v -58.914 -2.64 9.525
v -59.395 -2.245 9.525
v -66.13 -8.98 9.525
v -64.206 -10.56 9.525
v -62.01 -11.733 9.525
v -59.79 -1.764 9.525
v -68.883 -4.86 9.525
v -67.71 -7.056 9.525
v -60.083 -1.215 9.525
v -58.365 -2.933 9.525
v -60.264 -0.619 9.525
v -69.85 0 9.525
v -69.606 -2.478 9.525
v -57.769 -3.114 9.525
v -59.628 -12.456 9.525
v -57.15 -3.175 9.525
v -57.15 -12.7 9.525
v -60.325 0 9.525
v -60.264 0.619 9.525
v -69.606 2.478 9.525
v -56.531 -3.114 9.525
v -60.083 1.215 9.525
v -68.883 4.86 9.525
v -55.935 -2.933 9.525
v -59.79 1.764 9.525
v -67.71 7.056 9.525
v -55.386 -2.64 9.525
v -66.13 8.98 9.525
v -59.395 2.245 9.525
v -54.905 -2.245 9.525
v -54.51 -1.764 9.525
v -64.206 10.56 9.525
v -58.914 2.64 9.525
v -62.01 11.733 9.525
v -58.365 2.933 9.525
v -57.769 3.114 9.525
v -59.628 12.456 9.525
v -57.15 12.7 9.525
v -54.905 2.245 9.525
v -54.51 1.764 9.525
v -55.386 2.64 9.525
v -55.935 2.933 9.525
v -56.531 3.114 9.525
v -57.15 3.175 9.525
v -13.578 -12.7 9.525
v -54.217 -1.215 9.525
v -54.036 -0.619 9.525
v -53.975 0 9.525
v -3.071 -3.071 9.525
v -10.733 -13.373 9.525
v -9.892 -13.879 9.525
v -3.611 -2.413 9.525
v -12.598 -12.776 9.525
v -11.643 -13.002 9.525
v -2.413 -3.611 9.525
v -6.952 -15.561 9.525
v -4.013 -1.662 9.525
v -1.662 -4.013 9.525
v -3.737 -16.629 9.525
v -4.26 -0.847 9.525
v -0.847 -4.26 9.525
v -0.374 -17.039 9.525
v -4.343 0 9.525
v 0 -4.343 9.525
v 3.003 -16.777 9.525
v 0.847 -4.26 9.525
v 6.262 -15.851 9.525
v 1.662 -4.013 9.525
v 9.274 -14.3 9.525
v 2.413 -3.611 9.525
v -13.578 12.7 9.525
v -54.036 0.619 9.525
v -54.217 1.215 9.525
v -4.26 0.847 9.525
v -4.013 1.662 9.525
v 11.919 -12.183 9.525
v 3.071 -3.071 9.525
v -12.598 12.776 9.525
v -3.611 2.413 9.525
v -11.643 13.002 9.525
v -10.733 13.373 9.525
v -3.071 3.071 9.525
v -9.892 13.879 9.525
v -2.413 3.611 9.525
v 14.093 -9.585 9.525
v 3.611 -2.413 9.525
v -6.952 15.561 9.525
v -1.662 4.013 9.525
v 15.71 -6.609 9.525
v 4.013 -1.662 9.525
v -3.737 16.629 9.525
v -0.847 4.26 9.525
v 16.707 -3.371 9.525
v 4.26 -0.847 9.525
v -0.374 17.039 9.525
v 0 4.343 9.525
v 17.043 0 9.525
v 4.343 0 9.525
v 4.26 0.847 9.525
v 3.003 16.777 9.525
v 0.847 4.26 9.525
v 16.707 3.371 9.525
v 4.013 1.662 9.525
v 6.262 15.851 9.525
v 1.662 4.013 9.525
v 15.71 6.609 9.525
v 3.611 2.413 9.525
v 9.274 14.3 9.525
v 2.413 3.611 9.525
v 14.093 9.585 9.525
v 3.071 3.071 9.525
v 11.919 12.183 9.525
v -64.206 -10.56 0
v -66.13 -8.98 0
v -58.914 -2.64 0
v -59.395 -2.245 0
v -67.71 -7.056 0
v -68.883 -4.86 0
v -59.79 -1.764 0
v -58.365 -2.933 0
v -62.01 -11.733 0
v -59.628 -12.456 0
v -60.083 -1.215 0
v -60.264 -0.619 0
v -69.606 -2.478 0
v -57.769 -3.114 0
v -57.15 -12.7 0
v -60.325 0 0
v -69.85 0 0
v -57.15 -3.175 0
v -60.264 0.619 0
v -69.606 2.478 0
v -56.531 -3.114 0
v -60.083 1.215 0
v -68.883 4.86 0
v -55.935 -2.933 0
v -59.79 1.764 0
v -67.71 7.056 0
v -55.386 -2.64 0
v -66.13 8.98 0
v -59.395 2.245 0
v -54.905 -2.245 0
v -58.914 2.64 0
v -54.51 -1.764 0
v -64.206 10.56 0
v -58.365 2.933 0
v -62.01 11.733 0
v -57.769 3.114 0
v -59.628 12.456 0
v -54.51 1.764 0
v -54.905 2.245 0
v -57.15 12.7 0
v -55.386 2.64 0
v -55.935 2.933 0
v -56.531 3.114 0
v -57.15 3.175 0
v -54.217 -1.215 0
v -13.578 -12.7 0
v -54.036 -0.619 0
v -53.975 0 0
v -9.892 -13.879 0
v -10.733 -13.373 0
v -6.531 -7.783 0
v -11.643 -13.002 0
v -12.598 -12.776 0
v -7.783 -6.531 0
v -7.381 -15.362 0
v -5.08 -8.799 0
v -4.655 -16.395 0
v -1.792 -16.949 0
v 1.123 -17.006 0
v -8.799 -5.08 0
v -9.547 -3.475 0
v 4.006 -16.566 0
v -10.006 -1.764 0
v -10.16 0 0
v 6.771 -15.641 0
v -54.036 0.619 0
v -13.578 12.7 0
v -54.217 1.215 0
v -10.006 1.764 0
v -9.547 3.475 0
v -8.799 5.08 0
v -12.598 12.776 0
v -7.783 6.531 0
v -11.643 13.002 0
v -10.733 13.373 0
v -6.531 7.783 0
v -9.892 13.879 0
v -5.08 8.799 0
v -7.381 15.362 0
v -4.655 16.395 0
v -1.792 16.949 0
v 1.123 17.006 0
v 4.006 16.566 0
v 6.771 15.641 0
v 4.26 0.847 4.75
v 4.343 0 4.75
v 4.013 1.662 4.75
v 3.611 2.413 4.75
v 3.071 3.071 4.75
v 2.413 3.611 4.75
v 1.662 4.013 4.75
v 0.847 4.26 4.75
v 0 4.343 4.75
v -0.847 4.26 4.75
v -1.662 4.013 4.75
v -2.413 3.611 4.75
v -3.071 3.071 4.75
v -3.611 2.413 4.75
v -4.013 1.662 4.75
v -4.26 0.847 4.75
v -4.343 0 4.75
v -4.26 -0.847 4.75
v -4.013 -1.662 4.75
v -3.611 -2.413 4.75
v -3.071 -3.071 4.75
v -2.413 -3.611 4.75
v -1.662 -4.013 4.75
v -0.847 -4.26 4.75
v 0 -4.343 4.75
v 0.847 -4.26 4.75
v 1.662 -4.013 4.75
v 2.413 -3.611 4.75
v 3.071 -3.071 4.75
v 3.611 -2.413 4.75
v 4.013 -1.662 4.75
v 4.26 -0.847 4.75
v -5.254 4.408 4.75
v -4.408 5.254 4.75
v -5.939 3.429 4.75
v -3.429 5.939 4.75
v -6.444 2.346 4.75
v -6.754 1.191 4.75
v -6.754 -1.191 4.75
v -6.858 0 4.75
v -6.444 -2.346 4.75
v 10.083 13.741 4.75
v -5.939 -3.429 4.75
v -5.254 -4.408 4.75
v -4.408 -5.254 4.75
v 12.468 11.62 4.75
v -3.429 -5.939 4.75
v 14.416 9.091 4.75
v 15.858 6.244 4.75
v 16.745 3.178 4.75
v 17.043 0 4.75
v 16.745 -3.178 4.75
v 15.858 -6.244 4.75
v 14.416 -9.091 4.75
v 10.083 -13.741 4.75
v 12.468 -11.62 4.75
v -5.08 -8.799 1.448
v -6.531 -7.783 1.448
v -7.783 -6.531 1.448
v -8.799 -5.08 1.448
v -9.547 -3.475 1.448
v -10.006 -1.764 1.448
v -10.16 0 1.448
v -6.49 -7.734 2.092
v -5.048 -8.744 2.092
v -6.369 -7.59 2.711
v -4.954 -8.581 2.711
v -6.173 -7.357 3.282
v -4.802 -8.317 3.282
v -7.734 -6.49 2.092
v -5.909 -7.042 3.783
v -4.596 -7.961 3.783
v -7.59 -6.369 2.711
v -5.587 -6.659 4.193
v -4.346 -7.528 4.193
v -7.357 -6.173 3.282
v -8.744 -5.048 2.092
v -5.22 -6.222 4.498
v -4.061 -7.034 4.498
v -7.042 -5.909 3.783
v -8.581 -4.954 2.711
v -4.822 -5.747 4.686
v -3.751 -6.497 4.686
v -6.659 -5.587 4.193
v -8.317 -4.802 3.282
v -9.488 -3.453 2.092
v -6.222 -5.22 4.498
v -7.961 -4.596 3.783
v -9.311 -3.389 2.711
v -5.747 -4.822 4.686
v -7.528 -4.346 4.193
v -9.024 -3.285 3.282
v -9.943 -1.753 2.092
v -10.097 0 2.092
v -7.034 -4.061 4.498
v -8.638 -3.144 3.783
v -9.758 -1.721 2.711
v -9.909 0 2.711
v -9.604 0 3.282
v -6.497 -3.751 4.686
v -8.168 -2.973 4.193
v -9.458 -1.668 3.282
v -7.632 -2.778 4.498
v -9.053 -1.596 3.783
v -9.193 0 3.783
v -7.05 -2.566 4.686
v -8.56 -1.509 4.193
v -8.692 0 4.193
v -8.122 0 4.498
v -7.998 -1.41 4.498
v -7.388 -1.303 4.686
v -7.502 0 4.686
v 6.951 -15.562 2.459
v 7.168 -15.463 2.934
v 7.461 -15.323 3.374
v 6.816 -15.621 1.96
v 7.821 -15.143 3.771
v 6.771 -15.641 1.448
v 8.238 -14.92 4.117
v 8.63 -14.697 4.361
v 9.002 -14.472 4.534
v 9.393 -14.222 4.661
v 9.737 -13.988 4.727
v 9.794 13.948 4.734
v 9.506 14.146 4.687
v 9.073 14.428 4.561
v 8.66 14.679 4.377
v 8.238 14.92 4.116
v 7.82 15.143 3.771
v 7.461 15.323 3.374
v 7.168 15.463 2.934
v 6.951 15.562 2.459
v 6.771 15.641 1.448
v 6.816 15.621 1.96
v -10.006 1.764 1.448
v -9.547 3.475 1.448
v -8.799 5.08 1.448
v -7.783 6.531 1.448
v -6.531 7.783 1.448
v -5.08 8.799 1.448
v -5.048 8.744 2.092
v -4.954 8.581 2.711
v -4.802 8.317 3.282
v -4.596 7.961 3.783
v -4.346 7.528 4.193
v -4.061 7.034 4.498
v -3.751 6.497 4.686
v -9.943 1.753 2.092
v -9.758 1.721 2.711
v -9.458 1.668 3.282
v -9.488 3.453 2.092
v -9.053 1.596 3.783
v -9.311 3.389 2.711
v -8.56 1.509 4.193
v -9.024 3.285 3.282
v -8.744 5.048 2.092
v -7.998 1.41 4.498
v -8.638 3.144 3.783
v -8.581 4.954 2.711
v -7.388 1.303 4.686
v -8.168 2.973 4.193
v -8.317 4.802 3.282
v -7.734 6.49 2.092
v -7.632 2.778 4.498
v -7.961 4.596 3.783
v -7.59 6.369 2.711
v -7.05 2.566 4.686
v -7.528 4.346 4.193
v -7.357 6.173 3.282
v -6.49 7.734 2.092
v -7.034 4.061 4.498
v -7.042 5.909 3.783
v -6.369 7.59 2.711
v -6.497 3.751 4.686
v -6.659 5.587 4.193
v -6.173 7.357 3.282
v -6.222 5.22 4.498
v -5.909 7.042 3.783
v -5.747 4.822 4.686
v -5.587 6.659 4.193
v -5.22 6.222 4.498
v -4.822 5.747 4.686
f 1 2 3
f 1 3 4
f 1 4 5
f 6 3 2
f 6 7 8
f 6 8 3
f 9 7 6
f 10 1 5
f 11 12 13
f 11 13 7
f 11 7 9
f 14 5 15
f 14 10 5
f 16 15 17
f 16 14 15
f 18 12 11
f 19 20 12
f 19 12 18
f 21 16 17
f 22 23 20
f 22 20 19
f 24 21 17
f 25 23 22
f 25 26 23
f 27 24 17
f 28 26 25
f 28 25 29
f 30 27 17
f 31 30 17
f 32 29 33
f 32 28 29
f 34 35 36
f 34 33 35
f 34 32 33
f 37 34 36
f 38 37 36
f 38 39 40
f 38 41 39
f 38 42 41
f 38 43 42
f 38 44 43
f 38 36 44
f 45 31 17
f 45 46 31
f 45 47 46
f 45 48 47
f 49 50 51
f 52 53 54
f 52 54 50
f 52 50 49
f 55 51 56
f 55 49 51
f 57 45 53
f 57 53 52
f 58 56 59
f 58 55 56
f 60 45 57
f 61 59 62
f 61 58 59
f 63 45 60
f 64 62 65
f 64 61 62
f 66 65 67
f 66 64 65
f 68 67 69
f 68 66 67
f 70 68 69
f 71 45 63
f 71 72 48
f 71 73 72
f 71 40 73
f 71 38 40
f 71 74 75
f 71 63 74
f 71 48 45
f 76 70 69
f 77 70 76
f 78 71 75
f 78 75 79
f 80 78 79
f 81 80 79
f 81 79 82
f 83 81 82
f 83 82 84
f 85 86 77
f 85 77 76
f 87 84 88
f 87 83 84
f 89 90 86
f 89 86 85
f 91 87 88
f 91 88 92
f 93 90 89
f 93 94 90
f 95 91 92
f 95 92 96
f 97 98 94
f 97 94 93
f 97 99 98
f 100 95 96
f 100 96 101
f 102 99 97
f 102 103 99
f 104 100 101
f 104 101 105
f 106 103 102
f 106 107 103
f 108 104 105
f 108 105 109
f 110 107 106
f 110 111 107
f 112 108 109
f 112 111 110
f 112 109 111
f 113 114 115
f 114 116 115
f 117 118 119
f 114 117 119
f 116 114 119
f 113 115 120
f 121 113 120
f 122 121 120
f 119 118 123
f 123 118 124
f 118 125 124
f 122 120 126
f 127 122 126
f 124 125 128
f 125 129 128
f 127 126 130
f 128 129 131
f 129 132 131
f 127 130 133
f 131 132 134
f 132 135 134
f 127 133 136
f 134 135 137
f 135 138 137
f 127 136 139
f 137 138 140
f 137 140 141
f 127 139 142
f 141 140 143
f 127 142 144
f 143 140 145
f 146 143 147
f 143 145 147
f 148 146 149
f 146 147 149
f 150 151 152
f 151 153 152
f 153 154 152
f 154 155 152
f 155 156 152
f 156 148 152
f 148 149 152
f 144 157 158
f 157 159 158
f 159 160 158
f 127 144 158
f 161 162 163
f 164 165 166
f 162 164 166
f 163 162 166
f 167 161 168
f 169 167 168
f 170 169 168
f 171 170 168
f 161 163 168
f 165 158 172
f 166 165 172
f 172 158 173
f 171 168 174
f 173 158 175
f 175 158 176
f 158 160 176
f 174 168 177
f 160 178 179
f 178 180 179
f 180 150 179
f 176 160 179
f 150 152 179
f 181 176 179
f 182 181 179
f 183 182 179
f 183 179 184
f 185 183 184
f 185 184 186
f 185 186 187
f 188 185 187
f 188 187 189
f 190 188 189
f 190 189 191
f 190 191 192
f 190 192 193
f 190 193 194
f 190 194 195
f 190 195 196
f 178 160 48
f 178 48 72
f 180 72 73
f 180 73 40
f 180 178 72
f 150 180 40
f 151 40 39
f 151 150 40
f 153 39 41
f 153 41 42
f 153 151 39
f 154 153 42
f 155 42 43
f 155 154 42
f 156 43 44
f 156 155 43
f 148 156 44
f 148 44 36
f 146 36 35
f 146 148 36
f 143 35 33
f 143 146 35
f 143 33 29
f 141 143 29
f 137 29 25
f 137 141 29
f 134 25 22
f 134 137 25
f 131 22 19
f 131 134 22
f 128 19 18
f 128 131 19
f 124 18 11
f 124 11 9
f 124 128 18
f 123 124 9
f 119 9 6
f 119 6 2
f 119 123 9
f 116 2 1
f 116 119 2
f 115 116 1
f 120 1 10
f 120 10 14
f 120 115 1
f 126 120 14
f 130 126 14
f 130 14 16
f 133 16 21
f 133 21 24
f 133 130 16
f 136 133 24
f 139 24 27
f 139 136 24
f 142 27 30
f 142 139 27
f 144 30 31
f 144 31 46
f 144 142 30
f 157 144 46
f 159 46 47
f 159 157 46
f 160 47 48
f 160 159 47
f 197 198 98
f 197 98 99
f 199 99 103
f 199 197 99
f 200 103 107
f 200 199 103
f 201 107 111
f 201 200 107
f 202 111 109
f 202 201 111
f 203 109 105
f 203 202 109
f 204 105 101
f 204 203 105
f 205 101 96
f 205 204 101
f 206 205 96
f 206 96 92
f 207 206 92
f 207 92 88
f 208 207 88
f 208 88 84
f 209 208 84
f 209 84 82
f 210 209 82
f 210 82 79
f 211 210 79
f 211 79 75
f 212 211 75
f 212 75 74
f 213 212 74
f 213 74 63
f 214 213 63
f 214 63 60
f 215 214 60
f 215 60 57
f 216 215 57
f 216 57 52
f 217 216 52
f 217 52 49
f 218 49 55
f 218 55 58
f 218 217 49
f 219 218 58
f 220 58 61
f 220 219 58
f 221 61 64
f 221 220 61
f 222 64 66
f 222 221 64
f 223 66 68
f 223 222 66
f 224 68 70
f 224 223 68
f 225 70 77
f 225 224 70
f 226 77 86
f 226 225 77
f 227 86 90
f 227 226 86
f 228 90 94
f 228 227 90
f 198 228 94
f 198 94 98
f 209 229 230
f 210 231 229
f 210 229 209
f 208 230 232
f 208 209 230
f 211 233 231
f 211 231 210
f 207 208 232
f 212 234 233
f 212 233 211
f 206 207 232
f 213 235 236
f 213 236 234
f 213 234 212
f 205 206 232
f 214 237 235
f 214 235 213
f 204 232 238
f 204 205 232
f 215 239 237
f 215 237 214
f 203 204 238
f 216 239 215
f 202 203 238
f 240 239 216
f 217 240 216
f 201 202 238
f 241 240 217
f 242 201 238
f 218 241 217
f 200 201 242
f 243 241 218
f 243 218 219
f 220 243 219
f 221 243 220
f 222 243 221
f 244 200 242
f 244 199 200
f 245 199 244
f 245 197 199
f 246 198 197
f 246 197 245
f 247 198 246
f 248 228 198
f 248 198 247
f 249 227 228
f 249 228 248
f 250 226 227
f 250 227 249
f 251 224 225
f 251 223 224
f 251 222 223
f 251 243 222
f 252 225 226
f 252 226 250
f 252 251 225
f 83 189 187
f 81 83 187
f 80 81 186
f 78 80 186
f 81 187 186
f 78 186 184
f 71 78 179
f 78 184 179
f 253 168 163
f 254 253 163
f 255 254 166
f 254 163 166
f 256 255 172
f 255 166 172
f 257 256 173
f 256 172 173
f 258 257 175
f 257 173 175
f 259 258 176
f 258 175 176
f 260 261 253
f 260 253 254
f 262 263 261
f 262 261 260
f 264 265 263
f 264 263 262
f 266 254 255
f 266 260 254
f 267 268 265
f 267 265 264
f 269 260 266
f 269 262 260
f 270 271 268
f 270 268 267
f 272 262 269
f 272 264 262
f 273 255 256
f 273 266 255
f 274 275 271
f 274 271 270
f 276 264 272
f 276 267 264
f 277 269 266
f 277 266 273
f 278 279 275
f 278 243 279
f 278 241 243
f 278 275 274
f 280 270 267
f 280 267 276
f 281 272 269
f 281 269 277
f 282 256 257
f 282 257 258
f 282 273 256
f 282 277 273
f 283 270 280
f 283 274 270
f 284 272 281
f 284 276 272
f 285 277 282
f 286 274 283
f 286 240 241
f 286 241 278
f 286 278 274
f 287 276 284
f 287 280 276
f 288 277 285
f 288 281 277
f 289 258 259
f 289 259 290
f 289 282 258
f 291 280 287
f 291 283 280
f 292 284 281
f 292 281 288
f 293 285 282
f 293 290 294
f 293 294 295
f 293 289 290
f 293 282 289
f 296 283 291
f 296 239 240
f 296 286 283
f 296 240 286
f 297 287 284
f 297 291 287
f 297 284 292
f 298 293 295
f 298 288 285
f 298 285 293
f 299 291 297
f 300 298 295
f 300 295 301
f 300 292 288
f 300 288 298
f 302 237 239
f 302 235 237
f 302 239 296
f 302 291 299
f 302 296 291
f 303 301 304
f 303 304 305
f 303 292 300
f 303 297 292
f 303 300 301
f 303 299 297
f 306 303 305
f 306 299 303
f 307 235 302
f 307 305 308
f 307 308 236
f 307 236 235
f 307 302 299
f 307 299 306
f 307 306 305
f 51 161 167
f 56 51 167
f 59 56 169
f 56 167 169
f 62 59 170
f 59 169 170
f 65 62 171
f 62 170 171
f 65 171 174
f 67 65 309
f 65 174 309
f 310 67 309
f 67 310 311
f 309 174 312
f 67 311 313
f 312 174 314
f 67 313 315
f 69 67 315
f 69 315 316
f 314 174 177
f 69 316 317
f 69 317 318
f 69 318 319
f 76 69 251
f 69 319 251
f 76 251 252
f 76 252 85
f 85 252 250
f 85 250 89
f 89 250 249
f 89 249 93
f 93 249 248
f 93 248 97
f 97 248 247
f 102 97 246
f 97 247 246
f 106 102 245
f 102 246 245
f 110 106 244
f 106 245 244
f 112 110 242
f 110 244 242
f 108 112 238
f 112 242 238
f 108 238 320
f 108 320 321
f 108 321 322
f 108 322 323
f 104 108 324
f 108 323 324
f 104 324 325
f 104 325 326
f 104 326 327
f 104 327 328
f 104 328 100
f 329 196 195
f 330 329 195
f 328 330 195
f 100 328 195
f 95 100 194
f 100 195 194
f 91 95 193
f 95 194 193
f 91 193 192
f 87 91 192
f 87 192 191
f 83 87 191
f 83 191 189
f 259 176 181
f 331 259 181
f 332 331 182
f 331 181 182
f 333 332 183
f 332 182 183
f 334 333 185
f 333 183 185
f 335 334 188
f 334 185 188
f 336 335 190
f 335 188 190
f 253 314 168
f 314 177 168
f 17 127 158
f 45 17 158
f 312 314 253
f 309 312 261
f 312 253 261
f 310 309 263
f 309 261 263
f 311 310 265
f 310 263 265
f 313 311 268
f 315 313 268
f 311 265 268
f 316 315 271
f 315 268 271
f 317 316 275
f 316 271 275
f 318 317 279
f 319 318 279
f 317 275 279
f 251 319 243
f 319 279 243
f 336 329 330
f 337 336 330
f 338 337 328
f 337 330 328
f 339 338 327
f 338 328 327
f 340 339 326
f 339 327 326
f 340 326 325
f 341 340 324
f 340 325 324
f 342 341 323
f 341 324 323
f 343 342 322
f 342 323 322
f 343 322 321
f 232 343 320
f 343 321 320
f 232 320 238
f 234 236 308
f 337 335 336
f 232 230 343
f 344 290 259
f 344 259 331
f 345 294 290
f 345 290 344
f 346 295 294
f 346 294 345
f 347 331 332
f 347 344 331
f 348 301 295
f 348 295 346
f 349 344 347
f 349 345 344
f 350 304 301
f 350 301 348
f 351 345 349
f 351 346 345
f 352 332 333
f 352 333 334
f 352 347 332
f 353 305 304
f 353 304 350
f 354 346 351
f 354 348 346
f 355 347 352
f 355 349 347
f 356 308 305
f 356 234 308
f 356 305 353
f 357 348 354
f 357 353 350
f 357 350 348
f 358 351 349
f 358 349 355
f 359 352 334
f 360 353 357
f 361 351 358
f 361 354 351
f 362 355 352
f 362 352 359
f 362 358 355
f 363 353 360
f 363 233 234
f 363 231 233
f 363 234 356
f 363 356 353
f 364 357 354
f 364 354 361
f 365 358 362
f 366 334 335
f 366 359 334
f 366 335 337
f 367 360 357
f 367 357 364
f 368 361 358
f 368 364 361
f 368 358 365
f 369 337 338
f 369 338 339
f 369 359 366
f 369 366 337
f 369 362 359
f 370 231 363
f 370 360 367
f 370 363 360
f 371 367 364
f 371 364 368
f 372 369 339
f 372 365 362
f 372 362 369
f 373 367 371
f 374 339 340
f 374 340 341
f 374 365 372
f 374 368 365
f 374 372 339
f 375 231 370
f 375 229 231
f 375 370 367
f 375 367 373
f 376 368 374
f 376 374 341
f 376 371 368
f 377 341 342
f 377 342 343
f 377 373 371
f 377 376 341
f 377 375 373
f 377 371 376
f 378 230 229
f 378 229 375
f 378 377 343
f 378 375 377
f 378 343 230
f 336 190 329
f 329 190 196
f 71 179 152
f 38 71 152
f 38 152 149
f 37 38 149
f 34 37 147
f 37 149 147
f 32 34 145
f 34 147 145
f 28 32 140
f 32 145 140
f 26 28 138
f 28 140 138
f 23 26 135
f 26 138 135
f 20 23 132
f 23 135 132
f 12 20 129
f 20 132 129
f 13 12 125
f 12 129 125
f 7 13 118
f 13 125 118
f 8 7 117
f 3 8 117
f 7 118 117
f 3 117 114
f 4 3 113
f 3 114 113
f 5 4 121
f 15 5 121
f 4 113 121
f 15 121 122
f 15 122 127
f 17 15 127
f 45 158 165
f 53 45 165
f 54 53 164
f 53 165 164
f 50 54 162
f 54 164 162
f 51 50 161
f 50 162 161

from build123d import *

# Parameters (mm, degrees)
F0_R     = 3.175
F0_R_2   = 4.3434
F1_DEPTH = 9.525
F2_R     = 4.3434
F3_DEPTH = 4.7498
F4_R     = 3.302


with BuildPart() as f1:
    # F0 (on Top) → F1 (new body)
    with BuildSketch(Plane.XY):
        with BuildLine():
            ThreePointArc((-13.577506, -12.7), (-11.642746, -13.001925), (-9.891972, -13.87899))
            ThreePointArc((-9.891972, -13.87899), (17.0434, 0), (-9.891972, 13.87899))
            ThreePointArc((-9.891972, 13.87899), (-11.642746, 13.001925), (-13.577506, 12.7))
            Line((-13.577506, 12.7), (-57.15, 12.7))
            ThreePointArc((-57.15, 12.7), (-69.85, 0), (-57.15, -12.7))
            Line((-57.15, -12.7), (-13.577506, -12.7))
        make_face()
        with Locations((-57.15, 0)):
            Circle(F0_R, mode=Mode.SUBTRACT)
        Circle(F0_R_2, mode=Mode.SUBTRACT)
    extrude(amount=F1_DEPTH)

    # F2 (on face) → F3 (cut)
    with BuildSketch(Plane(origin=(0, 0, 0), x_dir=(1, 0, 0), z_dir=(0, 0, -1))):
        with BuildLine():
            Line((6.770692, 15.640819), (-5.08, 8.798818))
            ThreePointArc((-5.08, 8.798818), (-8.798818, 5.08), (-10.16, 0))
            ThreePointArc((-10.16, 0), (-8.798818, -5.08), (-5.08, -8.798818))
            Line((-5.08, -8.798818), (6.770692, -15.640819))
            ThreePointArc((6.770692, -15.640819), (17.0434, 0), (6.770692, 15.640819))
        make_face()
        Circle(F2_R, mode=Mode.SUBTRACT)
    extrude(amount=-F3_DEPTH, mode=Mode.SUBTRACT)

    # F4
    f4_edges = [f1.edges().sort_by_distance(p)[0] for p in [
        (0.845346, -12.219818, 4.7498),
    ]]
    fillet(f4_edges, radius=F4_R)


solid = f1.part
